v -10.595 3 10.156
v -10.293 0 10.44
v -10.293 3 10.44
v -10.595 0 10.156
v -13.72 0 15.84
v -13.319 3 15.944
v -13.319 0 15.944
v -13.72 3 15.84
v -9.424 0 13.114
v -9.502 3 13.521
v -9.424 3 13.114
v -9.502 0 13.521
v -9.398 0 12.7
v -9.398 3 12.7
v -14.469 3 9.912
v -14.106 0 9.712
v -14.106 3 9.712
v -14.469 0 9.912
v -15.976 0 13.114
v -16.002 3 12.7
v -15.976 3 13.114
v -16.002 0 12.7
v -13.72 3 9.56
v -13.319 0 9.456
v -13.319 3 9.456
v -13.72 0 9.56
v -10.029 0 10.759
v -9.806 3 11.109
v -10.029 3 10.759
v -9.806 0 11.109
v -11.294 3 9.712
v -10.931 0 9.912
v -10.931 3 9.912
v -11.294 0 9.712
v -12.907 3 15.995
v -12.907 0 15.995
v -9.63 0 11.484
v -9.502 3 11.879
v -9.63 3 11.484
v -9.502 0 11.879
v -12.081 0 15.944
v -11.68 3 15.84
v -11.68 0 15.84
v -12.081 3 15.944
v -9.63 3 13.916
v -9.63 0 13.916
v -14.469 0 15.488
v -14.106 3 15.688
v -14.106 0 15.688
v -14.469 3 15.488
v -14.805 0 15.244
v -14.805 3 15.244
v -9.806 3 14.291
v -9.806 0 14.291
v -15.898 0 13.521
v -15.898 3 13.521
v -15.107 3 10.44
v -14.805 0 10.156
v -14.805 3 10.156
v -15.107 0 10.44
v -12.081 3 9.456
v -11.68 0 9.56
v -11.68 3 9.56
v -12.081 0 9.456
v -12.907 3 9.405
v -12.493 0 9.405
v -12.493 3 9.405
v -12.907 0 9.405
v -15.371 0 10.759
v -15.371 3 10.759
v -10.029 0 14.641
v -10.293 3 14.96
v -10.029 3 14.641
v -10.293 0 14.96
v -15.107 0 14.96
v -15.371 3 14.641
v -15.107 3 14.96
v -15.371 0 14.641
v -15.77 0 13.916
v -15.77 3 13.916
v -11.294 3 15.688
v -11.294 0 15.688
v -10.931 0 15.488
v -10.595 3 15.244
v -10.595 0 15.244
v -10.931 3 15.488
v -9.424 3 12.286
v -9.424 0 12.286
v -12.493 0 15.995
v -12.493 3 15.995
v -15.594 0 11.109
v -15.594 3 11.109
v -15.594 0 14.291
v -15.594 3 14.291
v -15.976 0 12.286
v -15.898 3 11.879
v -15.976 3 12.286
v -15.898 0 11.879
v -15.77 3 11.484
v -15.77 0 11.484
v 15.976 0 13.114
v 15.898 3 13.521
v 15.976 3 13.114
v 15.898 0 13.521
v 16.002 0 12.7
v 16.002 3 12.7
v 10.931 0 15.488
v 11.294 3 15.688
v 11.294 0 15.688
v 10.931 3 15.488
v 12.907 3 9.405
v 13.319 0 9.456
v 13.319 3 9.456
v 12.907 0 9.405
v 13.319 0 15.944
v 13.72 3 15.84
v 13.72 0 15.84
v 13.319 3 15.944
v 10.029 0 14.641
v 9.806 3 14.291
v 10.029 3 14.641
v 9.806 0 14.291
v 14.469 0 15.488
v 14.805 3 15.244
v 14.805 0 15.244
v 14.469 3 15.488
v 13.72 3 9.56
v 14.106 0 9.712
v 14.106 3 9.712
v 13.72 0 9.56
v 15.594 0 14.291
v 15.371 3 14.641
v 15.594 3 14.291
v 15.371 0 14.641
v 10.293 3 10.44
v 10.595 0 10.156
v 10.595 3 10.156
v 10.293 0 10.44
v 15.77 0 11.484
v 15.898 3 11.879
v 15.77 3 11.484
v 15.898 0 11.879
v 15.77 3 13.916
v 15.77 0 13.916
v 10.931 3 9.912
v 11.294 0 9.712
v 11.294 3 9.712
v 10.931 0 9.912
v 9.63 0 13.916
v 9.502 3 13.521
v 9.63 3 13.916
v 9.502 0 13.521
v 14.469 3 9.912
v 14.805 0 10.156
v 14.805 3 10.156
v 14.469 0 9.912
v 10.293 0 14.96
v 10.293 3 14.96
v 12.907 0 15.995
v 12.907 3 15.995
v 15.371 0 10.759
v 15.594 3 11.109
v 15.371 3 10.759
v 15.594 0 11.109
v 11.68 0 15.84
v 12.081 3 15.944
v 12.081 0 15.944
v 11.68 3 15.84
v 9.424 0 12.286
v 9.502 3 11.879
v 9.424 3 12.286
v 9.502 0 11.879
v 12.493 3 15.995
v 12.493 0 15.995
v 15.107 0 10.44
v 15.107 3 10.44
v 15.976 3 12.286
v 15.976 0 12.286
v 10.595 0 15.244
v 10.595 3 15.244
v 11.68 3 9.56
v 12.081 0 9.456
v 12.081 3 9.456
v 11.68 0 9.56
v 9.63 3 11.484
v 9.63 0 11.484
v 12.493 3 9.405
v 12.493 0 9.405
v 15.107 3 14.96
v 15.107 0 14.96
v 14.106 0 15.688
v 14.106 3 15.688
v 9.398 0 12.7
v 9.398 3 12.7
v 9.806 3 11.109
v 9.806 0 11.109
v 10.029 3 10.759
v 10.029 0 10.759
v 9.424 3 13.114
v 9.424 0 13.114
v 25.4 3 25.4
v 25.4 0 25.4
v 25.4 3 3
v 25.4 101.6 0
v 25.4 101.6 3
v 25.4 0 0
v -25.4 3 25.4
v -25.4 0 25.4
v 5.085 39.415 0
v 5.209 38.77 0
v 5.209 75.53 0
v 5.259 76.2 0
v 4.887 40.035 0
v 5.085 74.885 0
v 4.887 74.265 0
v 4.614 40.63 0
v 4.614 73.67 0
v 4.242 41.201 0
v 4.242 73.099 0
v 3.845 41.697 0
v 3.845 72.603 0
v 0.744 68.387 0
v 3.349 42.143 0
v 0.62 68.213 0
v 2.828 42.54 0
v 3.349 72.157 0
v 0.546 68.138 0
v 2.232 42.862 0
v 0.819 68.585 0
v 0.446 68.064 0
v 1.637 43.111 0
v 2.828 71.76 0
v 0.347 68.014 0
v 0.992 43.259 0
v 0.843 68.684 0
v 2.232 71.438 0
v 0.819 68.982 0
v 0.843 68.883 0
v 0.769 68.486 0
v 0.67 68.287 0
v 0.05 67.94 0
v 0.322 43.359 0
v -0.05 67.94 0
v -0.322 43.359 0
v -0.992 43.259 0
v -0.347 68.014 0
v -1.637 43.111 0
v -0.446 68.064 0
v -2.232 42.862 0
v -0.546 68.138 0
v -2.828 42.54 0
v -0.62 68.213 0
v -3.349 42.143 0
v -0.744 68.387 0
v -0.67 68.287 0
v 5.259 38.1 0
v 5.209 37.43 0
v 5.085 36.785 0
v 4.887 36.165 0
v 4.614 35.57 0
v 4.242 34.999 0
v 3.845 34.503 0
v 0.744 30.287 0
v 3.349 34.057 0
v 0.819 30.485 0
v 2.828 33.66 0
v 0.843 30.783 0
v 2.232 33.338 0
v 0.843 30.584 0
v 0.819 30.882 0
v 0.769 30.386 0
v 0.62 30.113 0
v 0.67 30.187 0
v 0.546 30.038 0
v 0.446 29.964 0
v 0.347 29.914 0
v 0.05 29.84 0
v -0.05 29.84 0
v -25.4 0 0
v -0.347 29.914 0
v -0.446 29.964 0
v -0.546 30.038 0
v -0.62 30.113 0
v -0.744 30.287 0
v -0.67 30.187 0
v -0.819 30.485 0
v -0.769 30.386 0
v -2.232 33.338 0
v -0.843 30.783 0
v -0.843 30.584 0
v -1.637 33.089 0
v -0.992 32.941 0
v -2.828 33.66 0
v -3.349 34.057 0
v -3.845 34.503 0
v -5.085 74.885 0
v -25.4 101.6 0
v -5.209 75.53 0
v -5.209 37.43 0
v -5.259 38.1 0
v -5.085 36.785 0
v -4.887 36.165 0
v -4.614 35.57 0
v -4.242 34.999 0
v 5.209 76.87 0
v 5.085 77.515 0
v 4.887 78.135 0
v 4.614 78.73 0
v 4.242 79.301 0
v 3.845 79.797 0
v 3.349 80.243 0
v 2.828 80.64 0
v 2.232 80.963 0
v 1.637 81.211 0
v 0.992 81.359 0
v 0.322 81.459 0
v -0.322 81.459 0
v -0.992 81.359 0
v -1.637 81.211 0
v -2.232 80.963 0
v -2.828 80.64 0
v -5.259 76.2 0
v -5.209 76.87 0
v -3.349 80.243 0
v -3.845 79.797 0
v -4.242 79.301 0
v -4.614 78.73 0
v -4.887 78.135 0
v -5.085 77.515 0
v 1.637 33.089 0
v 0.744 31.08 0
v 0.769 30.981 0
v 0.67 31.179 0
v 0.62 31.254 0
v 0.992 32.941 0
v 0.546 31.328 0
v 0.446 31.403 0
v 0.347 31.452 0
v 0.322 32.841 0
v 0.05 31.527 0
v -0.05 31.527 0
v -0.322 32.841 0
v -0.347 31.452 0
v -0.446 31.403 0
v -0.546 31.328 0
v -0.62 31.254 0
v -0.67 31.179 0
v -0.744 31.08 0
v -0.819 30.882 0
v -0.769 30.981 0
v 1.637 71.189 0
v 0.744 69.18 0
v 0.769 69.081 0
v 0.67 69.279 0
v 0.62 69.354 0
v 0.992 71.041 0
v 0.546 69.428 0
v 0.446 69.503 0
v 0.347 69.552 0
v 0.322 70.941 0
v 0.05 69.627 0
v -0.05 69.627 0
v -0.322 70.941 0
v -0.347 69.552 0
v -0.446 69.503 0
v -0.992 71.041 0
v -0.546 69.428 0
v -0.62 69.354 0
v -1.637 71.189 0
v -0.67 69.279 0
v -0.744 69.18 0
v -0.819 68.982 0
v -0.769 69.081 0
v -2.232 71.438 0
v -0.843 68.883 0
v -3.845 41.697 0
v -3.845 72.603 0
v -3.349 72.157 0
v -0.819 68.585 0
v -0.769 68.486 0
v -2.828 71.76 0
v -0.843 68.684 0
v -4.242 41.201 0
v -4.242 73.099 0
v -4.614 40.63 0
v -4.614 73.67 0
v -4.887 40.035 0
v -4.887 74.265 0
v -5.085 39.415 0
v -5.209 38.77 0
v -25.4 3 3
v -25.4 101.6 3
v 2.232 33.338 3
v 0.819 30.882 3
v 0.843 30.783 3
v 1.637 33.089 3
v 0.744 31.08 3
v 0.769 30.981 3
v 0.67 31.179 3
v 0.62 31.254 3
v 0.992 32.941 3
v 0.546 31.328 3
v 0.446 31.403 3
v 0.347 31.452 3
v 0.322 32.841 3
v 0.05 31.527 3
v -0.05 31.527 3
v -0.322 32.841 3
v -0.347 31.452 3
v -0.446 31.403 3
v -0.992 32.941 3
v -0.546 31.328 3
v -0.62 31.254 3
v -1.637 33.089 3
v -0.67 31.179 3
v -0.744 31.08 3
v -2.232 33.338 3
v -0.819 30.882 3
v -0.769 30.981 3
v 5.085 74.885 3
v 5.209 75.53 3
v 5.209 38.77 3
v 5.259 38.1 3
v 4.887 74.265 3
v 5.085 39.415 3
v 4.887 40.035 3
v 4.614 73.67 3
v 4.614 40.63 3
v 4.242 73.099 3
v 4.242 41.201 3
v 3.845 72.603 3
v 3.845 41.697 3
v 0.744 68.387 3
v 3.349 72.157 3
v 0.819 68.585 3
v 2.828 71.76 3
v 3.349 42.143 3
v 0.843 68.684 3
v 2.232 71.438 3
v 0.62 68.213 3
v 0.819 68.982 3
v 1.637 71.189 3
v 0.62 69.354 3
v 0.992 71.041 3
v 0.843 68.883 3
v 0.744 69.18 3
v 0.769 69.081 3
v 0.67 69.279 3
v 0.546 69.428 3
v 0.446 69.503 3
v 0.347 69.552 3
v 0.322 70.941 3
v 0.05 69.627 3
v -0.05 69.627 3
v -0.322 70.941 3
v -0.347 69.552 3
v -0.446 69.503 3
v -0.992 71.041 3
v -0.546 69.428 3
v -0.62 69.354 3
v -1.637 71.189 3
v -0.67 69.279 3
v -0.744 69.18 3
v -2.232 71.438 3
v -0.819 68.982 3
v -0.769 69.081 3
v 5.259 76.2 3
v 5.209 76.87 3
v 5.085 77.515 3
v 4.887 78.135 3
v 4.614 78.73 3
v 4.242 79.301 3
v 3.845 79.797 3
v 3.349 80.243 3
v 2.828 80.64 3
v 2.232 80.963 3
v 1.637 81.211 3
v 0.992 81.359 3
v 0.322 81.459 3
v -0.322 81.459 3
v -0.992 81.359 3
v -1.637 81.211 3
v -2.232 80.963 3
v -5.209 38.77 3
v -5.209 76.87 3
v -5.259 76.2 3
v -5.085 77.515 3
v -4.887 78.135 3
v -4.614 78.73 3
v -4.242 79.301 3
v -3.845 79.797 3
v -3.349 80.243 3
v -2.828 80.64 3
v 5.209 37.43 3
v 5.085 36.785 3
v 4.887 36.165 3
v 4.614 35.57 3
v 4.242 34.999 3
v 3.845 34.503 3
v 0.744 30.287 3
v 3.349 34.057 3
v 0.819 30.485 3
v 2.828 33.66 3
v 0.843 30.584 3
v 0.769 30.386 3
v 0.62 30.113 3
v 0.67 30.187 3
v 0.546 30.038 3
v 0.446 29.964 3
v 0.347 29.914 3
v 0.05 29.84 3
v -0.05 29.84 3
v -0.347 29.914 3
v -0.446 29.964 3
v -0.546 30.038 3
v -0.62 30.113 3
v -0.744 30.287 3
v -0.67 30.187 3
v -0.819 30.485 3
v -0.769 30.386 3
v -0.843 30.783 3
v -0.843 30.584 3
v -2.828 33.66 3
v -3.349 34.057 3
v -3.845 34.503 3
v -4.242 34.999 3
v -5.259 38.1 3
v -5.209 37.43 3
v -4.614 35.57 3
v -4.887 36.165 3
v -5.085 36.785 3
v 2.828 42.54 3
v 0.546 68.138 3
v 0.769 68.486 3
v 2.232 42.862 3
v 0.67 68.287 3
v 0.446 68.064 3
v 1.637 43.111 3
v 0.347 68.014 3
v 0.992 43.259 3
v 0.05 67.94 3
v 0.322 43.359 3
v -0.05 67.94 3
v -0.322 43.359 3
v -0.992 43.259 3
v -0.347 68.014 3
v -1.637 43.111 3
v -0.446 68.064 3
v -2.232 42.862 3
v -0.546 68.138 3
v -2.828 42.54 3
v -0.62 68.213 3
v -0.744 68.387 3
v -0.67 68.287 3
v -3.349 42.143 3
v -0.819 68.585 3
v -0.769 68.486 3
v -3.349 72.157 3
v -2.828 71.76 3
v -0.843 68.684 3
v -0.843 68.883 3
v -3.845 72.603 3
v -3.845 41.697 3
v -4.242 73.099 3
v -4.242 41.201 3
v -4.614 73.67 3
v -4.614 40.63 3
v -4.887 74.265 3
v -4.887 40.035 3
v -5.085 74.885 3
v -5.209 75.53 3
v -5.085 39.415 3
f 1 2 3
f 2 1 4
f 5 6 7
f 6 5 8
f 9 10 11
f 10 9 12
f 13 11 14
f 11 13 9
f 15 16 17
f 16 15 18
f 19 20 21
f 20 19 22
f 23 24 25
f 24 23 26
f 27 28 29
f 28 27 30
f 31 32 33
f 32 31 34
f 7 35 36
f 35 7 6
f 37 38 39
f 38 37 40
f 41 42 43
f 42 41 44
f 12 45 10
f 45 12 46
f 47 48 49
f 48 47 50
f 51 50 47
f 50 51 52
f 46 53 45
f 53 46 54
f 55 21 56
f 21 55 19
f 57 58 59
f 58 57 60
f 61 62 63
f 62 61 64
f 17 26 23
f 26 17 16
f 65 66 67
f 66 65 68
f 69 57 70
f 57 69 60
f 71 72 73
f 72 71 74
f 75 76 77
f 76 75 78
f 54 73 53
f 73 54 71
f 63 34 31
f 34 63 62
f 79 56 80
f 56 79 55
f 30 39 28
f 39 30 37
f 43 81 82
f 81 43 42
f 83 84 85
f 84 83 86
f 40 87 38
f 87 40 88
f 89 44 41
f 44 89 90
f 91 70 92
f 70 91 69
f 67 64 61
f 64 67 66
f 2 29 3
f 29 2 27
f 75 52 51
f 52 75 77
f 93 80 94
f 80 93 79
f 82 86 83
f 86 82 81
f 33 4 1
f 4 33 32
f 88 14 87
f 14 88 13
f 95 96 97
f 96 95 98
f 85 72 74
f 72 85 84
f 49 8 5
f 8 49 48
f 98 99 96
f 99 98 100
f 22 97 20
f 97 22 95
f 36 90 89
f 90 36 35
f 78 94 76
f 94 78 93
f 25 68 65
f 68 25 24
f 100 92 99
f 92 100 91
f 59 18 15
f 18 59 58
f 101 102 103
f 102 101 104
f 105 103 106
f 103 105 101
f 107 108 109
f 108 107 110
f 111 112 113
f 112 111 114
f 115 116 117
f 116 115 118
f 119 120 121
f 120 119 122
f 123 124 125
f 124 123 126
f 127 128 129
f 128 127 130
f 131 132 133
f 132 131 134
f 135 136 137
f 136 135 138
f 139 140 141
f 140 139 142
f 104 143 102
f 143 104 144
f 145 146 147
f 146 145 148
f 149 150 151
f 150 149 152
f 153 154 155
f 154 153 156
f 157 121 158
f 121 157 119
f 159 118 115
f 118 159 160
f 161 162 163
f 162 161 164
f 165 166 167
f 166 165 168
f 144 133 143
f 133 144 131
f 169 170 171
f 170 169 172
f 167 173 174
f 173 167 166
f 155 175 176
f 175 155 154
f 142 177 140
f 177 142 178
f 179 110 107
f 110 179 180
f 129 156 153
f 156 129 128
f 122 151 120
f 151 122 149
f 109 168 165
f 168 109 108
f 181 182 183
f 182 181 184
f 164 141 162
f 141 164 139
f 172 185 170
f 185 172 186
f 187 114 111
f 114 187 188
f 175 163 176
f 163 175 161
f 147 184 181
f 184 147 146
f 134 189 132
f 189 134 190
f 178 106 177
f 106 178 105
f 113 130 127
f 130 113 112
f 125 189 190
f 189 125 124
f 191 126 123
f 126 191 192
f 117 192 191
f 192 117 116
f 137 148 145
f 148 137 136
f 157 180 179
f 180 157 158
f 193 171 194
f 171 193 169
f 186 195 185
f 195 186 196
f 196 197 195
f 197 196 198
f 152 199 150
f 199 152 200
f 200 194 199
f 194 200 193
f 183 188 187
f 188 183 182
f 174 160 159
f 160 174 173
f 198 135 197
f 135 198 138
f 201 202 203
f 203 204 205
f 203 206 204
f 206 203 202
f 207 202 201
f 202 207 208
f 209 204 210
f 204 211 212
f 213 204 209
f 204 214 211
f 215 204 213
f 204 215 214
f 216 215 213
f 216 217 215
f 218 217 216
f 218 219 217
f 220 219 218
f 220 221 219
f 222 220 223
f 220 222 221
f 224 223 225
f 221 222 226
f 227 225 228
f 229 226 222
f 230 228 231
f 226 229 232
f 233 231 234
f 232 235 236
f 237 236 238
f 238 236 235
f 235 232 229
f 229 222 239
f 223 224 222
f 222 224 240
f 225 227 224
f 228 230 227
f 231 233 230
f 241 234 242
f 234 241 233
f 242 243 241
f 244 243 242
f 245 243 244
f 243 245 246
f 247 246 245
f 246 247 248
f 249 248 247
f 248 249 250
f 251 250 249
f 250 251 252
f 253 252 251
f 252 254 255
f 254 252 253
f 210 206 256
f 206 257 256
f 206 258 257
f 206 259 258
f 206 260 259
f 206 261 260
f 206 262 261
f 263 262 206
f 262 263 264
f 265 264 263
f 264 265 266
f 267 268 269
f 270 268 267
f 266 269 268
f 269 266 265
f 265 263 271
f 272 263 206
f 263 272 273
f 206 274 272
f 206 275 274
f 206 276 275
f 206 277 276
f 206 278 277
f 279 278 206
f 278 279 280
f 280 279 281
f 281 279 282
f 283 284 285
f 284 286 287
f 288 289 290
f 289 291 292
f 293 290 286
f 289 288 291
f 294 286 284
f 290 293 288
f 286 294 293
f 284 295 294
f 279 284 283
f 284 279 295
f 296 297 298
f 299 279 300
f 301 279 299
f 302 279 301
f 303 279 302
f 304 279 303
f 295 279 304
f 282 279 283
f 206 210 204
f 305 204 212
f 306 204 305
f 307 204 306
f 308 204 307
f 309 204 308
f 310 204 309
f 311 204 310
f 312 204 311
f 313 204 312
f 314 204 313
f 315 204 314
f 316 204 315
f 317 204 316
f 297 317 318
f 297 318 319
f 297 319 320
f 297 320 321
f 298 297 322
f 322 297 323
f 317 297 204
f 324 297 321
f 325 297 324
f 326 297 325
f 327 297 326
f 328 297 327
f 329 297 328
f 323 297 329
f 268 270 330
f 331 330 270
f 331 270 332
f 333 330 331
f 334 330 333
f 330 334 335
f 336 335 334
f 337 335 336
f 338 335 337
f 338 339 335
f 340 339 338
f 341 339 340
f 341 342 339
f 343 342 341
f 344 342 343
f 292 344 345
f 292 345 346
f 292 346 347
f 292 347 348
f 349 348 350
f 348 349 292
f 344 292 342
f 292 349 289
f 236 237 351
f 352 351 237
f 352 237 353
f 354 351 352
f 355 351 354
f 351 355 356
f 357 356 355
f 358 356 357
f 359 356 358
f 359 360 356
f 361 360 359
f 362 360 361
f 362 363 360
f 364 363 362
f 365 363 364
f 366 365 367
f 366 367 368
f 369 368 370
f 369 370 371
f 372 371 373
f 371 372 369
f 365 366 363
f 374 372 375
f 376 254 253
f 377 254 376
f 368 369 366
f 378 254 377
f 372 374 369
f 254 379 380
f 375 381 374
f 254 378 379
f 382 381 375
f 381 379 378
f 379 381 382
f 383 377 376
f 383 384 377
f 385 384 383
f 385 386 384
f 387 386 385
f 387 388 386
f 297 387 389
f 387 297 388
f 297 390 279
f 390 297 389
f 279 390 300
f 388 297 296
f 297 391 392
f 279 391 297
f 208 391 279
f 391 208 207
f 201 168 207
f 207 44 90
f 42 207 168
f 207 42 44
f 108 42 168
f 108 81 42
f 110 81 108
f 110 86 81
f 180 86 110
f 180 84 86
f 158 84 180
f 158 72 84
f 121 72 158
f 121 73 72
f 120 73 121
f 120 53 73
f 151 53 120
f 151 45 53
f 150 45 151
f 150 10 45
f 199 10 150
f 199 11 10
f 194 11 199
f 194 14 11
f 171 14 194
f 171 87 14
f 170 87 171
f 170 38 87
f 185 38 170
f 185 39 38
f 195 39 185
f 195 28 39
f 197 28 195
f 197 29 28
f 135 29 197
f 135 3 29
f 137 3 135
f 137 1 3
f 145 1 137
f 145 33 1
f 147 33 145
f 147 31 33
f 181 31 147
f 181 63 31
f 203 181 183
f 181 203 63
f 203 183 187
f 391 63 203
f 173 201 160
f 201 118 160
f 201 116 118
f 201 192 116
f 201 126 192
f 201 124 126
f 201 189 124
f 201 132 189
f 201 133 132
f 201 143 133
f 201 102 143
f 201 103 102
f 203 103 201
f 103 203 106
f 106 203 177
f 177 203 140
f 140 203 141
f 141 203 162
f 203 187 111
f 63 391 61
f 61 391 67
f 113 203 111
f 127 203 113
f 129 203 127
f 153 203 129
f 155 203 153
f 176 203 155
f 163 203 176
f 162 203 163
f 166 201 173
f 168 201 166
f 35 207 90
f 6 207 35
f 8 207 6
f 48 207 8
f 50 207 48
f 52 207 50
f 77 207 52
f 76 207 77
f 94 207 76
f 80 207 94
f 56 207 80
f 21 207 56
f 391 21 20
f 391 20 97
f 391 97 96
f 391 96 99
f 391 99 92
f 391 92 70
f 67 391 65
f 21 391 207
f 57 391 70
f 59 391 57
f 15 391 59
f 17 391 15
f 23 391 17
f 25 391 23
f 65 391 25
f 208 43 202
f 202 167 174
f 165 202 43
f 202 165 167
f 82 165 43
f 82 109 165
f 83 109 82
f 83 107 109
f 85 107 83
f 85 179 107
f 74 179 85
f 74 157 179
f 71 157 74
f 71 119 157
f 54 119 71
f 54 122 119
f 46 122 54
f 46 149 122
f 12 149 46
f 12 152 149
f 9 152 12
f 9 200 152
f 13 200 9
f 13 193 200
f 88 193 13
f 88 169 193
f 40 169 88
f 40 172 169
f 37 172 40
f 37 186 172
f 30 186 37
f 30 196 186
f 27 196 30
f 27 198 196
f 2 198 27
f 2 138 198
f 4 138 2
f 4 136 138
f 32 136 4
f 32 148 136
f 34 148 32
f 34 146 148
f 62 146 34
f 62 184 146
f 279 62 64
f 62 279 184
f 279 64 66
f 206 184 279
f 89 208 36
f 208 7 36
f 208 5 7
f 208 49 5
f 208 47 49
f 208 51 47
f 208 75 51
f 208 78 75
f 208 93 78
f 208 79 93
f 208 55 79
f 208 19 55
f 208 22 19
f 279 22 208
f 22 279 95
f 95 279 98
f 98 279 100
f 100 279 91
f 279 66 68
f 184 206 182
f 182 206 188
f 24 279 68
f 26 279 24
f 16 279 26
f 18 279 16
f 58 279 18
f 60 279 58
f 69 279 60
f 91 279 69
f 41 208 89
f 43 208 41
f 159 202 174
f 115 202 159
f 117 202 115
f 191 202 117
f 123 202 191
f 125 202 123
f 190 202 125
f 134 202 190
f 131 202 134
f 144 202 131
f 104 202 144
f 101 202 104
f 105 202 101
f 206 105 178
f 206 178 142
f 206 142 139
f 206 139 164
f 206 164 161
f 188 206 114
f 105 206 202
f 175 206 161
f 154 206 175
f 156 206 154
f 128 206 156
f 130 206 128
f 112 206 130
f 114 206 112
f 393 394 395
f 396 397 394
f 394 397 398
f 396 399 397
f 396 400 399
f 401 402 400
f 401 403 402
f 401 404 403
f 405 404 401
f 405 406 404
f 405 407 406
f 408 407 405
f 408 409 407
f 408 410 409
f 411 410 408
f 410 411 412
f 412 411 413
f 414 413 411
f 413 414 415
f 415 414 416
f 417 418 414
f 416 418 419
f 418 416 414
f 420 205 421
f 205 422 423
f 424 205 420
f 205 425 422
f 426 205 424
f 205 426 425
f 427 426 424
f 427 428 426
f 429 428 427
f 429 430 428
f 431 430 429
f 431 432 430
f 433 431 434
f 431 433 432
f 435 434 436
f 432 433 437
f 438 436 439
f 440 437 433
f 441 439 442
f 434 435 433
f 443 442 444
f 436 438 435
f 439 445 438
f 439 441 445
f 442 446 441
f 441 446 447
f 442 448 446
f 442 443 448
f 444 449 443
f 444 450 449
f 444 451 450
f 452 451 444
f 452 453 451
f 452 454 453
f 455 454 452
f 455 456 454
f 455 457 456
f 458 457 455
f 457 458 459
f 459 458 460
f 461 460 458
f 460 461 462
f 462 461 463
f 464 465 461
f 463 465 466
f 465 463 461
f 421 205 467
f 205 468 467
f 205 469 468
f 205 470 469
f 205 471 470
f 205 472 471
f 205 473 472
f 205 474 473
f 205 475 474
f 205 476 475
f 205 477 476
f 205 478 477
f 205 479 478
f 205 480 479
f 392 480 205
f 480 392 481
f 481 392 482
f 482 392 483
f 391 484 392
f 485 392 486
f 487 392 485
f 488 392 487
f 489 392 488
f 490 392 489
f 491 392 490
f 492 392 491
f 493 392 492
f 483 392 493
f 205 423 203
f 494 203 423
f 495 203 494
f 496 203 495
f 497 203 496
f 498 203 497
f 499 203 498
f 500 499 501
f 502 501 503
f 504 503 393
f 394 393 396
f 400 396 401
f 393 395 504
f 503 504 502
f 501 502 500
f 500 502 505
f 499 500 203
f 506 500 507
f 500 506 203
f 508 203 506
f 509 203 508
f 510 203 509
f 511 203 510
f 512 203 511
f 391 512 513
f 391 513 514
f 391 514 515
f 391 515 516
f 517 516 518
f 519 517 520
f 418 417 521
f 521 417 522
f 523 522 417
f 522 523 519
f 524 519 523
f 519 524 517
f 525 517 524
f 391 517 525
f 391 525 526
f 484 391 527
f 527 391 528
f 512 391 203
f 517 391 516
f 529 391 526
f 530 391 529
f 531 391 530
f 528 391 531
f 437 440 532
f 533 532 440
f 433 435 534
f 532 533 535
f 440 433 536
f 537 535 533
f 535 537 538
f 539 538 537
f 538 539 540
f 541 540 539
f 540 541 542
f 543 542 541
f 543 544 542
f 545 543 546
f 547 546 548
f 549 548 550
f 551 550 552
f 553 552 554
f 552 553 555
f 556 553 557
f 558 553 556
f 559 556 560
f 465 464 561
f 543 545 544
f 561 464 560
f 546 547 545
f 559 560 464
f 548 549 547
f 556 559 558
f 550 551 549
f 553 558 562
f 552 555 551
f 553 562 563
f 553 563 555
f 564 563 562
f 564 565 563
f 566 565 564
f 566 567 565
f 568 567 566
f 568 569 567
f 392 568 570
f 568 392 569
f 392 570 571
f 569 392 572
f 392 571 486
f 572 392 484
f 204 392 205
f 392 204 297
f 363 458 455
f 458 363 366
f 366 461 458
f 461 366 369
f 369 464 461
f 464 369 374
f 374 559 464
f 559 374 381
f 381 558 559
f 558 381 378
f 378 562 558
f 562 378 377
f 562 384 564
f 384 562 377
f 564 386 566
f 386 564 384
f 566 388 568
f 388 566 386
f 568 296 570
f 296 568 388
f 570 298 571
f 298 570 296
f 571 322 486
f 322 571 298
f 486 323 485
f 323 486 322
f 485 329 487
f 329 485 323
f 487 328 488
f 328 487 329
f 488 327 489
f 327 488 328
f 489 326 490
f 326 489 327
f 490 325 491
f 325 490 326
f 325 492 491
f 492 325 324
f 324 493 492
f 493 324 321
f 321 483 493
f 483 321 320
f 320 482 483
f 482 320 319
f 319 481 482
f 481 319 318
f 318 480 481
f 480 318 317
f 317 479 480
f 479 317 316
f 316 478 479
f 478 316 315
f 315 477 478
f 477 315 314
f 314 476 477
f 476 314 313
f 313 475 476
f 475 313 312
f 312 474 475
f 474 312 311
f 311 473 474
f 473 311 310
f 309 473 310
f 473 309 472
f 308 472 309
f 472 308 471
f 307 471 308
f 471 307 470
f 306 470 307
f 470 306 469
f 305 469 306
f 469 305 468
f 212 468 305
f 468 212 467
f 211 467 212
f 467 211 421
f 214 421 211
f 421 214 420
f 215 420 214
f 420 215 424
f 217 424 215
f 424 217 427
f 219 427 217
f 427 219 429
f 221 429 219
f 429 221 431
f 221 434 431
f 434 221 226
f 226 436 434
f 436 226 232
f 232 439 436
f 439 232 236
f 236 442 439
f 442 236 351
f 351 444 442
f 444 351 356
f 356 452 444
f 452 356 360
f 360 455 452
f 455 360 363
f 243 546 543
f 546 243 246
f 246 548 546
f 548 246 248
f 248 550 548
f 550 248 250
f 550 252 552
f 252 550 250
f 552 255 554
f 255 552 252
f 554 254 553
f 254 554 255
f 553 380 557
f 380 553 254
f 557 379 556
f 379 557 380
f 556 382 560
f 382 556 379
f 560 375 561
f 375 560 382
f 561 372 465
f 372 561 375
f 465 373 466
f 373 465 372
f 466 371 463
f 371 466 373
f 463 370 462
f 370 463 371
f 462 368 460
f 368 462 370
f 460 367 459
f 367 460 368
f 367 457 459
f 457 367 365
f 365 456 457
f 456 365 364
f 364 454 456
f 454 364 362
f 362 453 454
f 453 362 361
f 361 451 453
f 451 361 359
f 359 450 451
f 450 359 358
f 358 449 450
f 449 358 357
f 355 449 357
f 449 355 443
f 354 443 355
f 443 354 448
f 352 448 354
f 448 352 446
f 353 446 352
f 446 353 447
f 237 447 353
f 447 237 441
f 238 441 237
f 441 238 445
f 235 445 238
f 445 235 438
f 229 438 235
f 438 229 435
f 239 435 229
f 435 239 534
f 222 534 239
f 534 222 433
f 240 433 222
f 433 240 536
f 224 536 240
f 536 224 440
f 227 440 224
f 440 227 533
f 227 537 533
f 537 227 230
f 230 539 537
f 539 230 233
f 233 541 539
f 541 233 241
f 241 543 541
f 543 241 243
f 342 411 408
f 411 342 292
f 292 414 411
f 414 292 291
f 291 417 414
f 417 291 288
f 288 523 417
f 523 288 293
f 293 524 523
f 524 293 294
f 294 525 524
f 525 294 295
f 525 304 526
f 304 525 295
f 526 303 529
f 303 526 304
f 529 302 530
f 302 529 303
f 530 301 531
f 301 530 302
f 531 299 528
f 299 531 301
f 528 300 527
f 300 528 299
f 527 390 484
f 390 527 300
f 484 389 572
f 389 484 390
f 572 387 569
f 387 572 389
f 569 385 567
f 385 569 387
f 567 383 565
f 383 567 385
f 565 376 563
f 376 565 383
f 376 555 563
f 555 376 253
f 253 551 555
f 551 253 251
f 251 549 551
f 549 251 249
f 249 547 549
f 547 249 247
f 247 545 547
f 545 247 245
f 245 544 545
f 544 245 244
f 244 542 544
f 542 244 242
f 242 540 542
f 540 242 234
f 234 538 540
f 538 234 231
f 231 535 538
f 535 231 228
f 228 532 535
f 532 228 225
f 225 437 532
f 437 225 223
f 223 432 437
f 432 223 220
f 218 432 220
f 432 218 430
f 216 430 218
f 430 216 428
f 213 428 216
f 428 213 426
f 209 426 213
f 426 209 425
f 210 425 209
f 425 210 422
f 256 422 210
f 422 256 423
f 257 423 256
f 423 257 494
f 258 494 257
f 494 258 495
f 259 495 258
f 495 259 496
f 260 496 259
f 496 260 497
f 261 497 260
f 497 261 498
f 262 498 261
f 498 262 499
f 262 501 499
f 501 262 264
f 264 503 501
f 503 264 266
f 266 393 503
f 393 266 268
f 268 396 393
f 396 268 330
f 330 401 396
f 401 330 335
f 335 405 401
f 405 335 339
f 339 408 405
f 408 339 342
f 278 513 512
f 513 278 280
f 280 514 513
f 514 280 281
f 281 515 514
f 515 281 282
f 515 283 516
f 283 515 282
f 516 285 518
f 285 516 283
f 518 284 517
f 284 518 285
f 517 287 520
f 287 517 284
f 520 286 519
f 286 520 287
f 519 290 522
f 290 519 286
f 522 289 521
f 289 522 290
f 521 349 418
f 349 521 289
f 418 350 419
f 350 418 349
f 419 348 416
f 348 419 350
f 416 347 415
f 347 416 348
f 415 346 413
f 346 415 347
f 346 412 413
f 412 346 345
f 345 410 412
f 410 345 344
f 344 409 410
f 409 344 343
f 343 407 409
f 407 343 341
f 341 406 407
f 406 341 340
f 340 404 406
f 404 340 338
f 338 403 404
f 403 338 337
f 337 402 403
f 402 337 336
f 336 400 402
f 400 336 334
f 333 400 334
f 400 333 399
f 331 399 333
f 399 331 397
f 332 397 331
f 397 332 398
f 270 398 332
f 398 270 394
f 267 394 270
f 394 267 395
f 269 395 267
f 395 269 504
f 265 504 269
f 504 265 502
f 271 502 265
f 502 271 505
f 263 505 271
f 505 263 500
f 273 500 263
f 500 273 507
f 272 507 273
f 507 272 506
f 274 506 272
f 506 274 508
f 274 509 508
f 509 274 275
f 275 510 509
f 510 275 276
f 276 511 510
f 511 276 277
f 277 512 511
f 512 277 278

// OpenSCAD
$fn=50;
inch = 25.4;

linear_extrude(3)
scale([inch, inch, 0]) 
import("./bourns.dxf");

difference() {

translate([-1*inch, 0, 0]) 
cube([2*inch, 3, 1*inch]);

union() {
   
translate([-0.5*inch, 0, 0.5*inch])
rotate([90, 0, 0])
cylinder(10, 0.13*inch, 0.13*inch, center=true);

translate([0.5*inch, 0, 0.5*inch])
rotate([90, 0, 0])
cylinder(10, 0.13*inch, 0.13*inch, center=true);

}
}
